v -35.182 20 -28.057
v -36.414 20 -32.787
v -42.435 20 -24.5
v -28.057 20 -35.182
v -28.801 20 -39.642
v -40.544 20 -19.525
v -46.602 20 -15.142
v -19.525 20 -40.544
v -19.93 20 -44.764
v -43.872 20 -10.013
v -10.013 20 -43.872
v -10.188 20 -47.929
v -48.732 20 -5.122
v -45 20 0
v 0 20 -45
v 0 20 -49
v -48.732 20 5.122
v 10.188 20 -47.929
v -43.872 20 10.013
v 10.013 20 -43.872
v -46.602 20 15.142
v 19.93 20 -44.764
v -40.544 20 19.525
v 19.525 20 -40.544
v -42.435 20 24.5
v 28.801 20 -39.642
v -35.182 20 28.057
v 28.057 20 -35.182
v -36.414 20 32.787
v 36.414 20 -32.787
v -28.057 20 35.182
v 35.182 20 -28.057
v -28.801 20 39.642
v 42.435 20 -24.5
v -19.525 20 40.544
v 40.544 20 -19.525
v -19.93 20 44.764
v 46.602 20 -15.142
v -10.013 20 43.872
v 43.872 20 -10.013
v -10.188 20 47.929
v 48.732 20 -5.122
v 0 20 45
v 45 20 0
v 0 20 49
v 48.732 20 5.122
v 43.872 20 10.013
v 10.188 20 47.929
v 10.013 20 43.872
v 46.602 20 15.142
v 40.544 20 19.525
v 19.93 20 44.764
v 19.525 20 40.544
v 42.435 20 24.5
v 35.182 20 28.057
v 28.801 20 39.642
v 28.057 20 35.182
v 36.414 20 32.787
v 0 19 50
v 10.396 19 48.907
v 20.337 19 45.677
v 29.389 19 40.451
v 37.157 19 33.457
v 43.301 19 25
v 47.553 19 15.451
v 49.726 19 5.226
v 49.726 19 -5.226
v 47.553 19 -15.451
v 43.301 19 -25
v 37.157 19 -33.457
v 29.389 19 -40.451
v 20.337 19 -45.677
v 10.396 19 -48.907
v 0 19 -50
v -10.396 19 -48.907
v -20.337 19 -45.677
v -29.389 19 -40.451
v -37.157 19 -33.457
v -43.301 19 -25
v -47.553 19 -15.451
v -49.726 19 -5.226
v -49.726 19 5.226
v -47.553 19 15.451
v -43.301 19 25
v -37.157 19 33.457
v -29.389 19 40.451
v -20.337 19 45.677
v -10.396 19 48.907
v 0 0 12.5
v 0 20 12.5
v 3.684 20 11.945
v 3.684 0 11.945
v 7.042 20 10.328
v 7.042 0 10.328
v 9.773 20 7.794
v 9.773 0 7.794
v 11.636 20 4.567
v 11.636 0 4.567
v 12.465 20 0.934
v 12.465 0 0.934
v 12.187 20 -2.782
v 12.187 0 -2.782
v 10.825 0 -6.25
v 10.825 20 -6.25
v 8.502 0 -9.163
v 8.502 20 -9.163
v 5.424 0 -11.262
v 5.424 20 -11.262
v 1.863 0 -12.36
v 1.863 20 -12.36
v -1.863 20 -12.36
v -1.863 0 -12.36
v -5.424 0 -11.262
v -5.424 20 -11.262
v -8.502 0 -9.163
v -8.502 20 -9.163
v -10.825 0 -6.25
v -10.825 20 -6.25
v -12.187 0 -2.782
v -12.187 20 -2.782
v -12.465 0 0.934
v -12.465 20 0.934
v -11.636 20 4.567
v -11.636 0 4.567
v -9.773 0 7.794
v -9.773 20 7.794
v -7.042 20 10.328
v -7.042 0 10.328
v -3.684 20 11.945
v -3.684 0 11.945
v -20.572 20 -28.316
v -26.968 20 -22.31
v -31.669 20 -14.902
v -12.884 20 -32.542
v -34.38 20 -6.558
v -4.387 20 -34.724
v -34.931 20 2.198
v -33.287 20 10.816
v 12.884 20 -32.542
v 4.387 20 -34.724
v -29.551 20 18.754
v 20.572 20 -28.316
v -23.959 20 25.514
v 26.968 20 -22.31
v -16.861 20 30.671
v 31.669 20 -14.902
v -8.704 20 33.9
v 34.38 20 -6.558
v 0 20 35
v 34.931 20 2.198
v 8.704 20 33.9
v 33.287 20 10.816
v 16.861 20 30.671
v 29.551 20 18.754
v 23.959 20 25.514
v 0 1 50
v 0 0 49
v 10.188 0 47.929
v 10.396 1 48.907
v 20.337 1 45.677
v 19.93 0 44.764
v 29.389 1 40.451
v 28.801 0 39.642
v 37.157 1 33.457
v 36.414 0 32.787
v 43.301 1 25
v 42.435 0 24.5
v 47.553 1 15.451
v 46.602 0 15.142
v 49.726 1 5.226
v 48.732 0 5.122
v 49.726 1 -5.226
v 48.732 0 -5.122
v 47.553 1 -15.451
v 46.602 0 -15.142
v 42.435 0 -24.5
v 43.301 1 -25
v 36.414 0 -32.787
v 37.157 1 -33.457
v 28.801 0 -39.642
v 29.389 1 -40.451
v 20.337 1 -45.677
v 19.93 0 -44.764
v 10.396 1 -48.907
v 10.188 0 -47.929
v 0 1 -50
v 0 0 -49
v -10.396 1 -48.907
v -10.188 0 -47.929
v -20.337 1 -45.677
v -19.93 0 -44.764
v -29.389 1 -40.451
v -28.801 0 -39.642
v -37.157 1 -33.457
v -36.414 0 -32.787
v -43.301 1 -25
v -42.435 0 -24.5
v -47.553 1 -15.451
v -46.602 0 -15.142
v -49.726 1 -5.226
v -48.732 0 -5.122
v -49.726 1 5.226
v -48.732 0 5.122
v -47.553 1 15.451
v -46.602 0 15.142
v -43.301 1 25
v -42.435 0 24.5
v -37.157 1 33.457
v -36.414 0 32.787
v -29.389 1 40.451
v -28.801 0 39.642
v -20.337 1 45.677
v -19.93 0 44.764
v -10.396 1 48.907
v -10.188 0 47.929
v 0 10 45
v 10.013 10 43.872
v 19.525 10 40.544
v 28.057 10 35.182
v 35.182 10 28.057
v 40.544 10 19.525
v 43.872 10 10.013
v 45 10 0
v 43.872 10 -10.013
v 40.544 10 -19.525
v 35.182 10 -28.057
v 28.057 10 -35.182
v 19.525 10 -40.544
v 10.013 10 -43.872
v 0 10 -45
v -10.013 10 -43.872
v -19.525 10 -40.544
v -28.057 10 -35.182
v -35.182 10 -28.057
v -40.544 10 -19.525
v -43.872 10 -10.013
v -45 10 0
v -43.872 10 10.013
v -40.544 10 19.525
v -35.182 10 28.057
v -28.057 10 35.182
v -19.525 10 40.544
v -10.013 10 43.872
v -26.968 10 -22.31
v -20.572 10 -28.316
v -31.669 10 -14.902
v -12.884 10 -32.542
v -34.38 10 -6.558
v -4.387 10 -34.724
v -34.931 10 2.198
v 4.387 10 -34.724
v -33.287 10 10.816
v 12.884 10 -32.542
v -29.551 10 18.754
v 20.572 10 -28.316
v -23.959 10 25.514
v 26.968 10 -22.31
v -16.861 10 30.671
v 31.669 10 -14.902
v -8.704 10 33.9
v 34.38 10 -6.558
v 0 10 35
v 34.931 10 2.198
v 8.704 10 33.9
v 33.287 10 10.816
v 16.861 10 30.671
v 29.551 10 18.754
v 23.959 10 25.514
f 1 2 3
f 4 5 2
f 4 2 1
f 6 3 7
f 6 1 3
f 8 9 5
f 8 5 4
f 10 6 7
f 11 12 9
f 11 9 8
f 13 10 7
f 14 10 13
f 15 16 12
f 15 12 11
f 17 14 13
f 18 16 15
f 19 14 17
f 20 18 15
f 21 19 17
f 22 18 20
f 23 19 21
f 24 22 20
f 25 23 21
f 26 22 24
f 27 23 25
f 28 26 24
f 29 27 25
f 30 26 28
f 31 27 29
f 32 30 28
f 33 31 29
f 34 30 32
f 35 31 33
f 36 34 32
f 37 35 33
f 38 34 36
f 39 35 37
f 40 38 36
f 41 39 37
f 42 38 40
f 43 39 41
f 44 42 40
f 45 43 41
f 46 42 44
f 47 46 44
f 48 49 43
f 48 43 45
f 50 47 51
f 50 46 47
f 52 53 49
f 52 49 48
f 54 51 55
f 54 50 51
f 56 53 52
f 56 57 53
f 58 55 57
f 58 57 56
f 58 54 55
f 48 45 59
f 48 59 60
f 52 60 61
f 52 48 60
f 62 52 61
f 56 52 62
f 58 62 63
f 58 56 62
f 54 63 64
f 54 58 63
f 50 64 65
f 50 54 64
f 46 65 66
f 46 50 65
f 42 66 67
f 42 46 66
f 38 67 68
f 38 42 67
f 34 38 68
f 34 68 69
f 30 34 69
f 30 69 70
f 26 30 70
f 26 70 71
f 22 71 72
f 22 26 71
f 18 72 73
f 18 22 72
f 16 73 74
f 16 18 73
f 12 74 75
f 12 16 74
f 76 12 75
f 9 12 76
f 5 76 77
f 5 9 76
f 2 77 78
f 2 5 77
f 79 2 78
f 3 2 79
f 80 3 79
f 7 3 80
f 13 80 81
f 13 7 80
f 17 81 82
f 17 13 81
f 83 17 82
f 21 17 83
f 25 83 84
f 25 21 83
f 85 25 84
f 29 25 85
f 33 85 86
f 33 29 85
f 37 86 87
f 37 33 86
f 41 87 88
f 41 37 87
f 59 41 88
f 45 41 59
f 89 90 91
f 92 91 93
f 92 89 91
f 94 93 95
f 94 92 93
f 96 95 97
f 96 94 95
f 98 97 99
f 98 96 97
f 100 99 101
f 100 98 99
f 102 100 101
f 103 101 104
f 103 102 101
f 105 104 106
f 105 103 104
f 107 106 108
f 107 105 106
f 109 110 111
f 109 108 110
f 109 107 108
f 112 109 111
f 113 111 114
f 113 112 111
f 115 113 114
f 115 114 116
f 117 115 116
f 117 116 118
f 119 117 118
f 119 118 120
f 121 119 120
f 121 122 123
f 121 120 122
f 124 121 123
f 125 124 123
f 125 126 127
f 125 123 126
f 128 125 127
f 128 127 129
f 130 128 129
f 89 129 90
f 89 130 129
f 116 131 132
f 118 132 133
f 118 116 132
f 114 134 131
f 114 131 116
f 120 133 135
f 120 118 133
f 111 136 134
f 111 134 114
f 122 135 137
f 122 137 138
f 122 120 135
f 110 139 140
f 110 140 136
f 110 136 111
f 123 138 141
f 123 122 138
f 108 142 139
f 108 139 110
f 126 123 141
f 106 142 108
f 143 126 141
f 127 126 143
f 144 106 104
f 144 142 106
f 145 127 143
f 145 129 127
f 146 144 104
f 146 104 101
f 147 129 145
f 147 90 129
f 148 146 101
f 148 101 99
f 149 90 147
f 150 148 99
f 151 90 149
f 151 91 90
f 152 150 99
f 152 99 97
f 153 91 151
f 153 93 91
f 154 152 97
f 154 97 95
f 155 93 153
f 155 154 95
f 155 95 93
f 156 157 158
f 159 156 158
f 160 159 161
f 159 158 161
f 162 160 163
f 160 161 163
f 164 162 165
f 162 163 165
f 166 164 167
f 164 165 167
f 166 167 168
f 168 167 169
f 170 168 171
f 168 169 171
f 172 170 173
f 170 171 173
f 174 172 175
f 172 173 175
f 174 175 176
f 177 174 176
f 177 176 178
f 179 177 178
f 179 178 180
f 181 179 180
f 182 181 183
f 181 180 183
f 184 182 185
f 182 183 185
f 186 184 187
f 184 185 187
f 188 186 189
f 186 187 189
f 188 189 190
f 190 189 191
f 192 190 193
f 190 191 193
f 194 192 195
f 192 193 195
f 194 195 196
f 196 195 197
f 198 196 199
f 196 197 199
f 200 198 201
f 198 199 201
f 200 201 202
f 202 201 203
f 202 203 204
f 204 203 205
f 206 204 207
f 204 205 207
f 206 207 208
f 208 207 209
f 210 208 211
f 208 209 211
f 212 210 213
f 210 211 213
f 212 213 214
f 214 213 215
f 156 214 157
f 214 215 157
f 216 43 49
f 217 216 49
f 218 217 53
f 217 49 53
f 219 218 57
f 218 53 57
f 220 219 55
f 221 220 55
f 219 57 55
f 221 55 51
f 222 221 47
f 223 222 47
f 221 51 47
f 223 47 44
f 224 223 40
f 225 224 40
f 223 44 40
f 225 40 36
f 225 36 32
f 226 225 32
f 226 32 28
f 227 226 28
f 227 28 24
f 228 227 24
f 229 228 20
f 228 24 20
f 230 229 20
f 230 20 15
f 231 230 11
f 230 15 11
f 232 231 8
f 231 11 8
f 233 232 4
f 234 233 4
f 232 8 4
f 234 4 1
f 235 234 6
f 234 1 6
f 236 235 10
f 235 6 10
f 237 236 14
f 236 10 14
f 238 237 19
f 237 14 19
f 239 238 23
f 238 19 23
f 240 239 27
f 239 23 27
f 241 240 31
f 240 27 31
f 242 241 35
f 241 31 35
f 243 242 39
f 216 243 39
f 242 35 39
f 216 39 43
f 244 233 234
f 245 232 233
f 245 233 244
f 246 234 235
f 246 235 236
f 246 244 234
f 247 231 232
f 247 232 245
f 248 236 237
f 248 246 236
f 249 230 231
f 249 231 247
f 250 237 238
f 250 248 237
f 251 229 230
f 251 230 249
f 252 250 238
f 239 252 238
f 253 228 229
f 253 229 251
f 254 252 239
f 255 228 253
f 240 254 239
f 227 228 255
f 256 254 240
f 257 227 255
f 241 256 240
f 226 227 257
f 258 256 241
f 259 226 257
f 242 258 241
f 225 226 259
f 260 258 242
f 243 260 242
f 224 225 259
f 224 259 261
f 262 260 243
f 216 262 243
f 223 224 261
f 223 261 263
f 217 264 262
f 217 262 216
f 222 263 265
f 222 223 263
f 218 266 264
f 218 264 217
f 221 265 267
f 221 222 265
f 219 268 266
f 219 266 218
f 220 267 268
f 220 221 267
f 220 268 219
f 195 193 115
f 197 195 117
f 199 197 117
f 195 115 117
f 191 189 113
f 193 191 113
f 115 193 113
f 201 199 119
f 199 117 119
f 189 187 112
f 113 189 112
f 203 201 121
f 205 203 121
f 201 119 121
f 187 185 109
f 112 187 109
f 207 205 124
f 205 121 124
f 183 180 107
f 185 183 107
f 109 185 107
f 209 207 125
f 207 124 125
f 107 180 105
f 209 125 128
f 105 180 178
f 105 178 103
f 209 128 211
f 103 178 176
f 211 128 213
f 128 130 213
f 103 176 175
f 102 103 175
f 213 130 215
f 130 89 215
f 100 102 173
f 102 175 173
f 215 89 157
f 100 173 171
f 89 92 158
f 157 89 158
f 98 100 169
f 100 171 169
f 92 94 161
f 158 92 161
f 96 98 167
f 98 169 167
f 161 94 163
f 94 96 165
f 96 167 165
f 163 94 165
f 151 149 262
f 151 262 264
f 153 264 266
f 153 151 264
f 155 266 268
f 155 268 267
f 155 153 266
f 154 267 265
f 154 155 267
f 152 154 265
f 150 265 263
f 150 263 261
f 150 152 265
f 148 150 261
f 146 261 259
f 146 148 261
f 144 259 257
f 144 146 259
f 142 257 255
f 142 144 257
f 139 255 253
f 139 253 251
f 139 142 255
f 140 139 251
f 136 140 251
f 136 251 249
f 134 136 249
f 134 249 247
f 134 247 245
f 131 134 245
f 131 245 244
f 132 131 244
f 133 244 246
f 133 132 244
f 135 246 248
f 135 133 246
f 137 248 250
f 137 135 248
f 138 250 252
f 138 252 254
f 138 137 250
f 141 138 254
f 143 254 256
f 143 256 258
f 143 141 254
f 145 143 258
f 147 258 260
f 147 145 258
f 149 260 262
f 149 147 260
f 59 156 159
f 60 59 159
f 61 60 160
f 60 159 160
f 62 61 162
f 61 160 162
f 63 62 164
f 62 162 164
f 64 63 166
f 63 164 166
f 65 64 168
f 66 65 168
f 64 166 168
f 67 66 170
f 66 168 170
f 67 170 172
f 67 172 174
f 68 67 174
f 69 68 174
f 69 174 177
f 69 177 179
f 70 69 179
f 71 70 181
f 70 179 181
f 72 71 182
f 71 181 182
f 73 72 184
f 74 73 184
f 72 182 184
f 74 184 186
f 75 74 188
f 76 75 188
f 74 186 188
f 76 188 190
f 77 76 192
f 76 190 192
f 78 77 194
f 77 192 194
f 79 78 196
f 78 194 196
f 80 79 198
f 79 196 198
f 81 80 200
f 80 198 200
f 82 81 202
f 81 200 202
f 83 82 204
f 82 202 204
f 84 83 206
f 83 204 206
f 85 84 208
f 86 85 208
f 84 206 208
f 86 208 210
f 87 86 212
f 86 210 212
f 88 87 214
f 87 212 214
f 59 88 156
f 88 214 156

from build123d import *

# Parameters (mm, degrees)
SKETCH_1_R          = 50
EXTRUDE_1_DEPTH     = 20
SKETCH_2_R          = 45
SKETCH_2_R_2        = 35
CUT_EXTRUDE_1_DEPTH = 10
SKETCH_3_R          = 12.5
CUT_EXTRUDE_2_DEPTH = 74.484692283
CHAMFER_1_SIZE      = 1


with BuildPart() as part:
    # 草图1 → 凸台-拉伸1 (new body)
    with BuildSketch(Plane(origin=(0, 0, 0), x_dir=(1, 0, 0), z_dir=(0, 1, 0))):
        with Locations(Location((0, 0, 0), (0, 0, 270))):
            Circle(SKETCH_1_R)
    extrude(amount=EXTRUDE_1_DEPTH)

    # 草图2 → 切除-拉伸1 (cut)
    with BuildSketch(Plane(origin=(0, 20, 0), x_dir=(1, 0, 0), z_dir=(0, 1, 0))):
        with Locations(Location((0, 0, 0), (0, 0, 270))):
            Circle(SKETCH_2_R)
        with Locations(Location((0, 0, 0), (0, 0, 270))):
            Circle(SKETCH_2_R_2, mode=Mode.SUBTRACT)
    extrude(amount=-CUT_EXTRUDE_1_DEPTH, mode=Mode.SUBTRACT)

    # 草图3 → 切除-拉伸2 (cut, through all)
    with BuildSketch(Plane(origin=(0, 0, 0), x_dir=(1, 0, 0), z_dir=(0, 1, 0))):
        with Locations(Location((0, 0, 0), (0, 0, 270))):
            Circle(SKETCH_3_R)
    extrude(amount=CUT_EXTRUDE_2_DEPTH, mode=Mode.SUBTRACT)

    # 倒角1
    chamfer_1_edges = [part.edges().sort_by_distance(p)[0] for p in [
        (0, 0, -50),
        (0, 20, -50),
    ]]
    chamfer(chamfer_1_edges, length=CHAMFER_1_SIZE)


solid = part.part
